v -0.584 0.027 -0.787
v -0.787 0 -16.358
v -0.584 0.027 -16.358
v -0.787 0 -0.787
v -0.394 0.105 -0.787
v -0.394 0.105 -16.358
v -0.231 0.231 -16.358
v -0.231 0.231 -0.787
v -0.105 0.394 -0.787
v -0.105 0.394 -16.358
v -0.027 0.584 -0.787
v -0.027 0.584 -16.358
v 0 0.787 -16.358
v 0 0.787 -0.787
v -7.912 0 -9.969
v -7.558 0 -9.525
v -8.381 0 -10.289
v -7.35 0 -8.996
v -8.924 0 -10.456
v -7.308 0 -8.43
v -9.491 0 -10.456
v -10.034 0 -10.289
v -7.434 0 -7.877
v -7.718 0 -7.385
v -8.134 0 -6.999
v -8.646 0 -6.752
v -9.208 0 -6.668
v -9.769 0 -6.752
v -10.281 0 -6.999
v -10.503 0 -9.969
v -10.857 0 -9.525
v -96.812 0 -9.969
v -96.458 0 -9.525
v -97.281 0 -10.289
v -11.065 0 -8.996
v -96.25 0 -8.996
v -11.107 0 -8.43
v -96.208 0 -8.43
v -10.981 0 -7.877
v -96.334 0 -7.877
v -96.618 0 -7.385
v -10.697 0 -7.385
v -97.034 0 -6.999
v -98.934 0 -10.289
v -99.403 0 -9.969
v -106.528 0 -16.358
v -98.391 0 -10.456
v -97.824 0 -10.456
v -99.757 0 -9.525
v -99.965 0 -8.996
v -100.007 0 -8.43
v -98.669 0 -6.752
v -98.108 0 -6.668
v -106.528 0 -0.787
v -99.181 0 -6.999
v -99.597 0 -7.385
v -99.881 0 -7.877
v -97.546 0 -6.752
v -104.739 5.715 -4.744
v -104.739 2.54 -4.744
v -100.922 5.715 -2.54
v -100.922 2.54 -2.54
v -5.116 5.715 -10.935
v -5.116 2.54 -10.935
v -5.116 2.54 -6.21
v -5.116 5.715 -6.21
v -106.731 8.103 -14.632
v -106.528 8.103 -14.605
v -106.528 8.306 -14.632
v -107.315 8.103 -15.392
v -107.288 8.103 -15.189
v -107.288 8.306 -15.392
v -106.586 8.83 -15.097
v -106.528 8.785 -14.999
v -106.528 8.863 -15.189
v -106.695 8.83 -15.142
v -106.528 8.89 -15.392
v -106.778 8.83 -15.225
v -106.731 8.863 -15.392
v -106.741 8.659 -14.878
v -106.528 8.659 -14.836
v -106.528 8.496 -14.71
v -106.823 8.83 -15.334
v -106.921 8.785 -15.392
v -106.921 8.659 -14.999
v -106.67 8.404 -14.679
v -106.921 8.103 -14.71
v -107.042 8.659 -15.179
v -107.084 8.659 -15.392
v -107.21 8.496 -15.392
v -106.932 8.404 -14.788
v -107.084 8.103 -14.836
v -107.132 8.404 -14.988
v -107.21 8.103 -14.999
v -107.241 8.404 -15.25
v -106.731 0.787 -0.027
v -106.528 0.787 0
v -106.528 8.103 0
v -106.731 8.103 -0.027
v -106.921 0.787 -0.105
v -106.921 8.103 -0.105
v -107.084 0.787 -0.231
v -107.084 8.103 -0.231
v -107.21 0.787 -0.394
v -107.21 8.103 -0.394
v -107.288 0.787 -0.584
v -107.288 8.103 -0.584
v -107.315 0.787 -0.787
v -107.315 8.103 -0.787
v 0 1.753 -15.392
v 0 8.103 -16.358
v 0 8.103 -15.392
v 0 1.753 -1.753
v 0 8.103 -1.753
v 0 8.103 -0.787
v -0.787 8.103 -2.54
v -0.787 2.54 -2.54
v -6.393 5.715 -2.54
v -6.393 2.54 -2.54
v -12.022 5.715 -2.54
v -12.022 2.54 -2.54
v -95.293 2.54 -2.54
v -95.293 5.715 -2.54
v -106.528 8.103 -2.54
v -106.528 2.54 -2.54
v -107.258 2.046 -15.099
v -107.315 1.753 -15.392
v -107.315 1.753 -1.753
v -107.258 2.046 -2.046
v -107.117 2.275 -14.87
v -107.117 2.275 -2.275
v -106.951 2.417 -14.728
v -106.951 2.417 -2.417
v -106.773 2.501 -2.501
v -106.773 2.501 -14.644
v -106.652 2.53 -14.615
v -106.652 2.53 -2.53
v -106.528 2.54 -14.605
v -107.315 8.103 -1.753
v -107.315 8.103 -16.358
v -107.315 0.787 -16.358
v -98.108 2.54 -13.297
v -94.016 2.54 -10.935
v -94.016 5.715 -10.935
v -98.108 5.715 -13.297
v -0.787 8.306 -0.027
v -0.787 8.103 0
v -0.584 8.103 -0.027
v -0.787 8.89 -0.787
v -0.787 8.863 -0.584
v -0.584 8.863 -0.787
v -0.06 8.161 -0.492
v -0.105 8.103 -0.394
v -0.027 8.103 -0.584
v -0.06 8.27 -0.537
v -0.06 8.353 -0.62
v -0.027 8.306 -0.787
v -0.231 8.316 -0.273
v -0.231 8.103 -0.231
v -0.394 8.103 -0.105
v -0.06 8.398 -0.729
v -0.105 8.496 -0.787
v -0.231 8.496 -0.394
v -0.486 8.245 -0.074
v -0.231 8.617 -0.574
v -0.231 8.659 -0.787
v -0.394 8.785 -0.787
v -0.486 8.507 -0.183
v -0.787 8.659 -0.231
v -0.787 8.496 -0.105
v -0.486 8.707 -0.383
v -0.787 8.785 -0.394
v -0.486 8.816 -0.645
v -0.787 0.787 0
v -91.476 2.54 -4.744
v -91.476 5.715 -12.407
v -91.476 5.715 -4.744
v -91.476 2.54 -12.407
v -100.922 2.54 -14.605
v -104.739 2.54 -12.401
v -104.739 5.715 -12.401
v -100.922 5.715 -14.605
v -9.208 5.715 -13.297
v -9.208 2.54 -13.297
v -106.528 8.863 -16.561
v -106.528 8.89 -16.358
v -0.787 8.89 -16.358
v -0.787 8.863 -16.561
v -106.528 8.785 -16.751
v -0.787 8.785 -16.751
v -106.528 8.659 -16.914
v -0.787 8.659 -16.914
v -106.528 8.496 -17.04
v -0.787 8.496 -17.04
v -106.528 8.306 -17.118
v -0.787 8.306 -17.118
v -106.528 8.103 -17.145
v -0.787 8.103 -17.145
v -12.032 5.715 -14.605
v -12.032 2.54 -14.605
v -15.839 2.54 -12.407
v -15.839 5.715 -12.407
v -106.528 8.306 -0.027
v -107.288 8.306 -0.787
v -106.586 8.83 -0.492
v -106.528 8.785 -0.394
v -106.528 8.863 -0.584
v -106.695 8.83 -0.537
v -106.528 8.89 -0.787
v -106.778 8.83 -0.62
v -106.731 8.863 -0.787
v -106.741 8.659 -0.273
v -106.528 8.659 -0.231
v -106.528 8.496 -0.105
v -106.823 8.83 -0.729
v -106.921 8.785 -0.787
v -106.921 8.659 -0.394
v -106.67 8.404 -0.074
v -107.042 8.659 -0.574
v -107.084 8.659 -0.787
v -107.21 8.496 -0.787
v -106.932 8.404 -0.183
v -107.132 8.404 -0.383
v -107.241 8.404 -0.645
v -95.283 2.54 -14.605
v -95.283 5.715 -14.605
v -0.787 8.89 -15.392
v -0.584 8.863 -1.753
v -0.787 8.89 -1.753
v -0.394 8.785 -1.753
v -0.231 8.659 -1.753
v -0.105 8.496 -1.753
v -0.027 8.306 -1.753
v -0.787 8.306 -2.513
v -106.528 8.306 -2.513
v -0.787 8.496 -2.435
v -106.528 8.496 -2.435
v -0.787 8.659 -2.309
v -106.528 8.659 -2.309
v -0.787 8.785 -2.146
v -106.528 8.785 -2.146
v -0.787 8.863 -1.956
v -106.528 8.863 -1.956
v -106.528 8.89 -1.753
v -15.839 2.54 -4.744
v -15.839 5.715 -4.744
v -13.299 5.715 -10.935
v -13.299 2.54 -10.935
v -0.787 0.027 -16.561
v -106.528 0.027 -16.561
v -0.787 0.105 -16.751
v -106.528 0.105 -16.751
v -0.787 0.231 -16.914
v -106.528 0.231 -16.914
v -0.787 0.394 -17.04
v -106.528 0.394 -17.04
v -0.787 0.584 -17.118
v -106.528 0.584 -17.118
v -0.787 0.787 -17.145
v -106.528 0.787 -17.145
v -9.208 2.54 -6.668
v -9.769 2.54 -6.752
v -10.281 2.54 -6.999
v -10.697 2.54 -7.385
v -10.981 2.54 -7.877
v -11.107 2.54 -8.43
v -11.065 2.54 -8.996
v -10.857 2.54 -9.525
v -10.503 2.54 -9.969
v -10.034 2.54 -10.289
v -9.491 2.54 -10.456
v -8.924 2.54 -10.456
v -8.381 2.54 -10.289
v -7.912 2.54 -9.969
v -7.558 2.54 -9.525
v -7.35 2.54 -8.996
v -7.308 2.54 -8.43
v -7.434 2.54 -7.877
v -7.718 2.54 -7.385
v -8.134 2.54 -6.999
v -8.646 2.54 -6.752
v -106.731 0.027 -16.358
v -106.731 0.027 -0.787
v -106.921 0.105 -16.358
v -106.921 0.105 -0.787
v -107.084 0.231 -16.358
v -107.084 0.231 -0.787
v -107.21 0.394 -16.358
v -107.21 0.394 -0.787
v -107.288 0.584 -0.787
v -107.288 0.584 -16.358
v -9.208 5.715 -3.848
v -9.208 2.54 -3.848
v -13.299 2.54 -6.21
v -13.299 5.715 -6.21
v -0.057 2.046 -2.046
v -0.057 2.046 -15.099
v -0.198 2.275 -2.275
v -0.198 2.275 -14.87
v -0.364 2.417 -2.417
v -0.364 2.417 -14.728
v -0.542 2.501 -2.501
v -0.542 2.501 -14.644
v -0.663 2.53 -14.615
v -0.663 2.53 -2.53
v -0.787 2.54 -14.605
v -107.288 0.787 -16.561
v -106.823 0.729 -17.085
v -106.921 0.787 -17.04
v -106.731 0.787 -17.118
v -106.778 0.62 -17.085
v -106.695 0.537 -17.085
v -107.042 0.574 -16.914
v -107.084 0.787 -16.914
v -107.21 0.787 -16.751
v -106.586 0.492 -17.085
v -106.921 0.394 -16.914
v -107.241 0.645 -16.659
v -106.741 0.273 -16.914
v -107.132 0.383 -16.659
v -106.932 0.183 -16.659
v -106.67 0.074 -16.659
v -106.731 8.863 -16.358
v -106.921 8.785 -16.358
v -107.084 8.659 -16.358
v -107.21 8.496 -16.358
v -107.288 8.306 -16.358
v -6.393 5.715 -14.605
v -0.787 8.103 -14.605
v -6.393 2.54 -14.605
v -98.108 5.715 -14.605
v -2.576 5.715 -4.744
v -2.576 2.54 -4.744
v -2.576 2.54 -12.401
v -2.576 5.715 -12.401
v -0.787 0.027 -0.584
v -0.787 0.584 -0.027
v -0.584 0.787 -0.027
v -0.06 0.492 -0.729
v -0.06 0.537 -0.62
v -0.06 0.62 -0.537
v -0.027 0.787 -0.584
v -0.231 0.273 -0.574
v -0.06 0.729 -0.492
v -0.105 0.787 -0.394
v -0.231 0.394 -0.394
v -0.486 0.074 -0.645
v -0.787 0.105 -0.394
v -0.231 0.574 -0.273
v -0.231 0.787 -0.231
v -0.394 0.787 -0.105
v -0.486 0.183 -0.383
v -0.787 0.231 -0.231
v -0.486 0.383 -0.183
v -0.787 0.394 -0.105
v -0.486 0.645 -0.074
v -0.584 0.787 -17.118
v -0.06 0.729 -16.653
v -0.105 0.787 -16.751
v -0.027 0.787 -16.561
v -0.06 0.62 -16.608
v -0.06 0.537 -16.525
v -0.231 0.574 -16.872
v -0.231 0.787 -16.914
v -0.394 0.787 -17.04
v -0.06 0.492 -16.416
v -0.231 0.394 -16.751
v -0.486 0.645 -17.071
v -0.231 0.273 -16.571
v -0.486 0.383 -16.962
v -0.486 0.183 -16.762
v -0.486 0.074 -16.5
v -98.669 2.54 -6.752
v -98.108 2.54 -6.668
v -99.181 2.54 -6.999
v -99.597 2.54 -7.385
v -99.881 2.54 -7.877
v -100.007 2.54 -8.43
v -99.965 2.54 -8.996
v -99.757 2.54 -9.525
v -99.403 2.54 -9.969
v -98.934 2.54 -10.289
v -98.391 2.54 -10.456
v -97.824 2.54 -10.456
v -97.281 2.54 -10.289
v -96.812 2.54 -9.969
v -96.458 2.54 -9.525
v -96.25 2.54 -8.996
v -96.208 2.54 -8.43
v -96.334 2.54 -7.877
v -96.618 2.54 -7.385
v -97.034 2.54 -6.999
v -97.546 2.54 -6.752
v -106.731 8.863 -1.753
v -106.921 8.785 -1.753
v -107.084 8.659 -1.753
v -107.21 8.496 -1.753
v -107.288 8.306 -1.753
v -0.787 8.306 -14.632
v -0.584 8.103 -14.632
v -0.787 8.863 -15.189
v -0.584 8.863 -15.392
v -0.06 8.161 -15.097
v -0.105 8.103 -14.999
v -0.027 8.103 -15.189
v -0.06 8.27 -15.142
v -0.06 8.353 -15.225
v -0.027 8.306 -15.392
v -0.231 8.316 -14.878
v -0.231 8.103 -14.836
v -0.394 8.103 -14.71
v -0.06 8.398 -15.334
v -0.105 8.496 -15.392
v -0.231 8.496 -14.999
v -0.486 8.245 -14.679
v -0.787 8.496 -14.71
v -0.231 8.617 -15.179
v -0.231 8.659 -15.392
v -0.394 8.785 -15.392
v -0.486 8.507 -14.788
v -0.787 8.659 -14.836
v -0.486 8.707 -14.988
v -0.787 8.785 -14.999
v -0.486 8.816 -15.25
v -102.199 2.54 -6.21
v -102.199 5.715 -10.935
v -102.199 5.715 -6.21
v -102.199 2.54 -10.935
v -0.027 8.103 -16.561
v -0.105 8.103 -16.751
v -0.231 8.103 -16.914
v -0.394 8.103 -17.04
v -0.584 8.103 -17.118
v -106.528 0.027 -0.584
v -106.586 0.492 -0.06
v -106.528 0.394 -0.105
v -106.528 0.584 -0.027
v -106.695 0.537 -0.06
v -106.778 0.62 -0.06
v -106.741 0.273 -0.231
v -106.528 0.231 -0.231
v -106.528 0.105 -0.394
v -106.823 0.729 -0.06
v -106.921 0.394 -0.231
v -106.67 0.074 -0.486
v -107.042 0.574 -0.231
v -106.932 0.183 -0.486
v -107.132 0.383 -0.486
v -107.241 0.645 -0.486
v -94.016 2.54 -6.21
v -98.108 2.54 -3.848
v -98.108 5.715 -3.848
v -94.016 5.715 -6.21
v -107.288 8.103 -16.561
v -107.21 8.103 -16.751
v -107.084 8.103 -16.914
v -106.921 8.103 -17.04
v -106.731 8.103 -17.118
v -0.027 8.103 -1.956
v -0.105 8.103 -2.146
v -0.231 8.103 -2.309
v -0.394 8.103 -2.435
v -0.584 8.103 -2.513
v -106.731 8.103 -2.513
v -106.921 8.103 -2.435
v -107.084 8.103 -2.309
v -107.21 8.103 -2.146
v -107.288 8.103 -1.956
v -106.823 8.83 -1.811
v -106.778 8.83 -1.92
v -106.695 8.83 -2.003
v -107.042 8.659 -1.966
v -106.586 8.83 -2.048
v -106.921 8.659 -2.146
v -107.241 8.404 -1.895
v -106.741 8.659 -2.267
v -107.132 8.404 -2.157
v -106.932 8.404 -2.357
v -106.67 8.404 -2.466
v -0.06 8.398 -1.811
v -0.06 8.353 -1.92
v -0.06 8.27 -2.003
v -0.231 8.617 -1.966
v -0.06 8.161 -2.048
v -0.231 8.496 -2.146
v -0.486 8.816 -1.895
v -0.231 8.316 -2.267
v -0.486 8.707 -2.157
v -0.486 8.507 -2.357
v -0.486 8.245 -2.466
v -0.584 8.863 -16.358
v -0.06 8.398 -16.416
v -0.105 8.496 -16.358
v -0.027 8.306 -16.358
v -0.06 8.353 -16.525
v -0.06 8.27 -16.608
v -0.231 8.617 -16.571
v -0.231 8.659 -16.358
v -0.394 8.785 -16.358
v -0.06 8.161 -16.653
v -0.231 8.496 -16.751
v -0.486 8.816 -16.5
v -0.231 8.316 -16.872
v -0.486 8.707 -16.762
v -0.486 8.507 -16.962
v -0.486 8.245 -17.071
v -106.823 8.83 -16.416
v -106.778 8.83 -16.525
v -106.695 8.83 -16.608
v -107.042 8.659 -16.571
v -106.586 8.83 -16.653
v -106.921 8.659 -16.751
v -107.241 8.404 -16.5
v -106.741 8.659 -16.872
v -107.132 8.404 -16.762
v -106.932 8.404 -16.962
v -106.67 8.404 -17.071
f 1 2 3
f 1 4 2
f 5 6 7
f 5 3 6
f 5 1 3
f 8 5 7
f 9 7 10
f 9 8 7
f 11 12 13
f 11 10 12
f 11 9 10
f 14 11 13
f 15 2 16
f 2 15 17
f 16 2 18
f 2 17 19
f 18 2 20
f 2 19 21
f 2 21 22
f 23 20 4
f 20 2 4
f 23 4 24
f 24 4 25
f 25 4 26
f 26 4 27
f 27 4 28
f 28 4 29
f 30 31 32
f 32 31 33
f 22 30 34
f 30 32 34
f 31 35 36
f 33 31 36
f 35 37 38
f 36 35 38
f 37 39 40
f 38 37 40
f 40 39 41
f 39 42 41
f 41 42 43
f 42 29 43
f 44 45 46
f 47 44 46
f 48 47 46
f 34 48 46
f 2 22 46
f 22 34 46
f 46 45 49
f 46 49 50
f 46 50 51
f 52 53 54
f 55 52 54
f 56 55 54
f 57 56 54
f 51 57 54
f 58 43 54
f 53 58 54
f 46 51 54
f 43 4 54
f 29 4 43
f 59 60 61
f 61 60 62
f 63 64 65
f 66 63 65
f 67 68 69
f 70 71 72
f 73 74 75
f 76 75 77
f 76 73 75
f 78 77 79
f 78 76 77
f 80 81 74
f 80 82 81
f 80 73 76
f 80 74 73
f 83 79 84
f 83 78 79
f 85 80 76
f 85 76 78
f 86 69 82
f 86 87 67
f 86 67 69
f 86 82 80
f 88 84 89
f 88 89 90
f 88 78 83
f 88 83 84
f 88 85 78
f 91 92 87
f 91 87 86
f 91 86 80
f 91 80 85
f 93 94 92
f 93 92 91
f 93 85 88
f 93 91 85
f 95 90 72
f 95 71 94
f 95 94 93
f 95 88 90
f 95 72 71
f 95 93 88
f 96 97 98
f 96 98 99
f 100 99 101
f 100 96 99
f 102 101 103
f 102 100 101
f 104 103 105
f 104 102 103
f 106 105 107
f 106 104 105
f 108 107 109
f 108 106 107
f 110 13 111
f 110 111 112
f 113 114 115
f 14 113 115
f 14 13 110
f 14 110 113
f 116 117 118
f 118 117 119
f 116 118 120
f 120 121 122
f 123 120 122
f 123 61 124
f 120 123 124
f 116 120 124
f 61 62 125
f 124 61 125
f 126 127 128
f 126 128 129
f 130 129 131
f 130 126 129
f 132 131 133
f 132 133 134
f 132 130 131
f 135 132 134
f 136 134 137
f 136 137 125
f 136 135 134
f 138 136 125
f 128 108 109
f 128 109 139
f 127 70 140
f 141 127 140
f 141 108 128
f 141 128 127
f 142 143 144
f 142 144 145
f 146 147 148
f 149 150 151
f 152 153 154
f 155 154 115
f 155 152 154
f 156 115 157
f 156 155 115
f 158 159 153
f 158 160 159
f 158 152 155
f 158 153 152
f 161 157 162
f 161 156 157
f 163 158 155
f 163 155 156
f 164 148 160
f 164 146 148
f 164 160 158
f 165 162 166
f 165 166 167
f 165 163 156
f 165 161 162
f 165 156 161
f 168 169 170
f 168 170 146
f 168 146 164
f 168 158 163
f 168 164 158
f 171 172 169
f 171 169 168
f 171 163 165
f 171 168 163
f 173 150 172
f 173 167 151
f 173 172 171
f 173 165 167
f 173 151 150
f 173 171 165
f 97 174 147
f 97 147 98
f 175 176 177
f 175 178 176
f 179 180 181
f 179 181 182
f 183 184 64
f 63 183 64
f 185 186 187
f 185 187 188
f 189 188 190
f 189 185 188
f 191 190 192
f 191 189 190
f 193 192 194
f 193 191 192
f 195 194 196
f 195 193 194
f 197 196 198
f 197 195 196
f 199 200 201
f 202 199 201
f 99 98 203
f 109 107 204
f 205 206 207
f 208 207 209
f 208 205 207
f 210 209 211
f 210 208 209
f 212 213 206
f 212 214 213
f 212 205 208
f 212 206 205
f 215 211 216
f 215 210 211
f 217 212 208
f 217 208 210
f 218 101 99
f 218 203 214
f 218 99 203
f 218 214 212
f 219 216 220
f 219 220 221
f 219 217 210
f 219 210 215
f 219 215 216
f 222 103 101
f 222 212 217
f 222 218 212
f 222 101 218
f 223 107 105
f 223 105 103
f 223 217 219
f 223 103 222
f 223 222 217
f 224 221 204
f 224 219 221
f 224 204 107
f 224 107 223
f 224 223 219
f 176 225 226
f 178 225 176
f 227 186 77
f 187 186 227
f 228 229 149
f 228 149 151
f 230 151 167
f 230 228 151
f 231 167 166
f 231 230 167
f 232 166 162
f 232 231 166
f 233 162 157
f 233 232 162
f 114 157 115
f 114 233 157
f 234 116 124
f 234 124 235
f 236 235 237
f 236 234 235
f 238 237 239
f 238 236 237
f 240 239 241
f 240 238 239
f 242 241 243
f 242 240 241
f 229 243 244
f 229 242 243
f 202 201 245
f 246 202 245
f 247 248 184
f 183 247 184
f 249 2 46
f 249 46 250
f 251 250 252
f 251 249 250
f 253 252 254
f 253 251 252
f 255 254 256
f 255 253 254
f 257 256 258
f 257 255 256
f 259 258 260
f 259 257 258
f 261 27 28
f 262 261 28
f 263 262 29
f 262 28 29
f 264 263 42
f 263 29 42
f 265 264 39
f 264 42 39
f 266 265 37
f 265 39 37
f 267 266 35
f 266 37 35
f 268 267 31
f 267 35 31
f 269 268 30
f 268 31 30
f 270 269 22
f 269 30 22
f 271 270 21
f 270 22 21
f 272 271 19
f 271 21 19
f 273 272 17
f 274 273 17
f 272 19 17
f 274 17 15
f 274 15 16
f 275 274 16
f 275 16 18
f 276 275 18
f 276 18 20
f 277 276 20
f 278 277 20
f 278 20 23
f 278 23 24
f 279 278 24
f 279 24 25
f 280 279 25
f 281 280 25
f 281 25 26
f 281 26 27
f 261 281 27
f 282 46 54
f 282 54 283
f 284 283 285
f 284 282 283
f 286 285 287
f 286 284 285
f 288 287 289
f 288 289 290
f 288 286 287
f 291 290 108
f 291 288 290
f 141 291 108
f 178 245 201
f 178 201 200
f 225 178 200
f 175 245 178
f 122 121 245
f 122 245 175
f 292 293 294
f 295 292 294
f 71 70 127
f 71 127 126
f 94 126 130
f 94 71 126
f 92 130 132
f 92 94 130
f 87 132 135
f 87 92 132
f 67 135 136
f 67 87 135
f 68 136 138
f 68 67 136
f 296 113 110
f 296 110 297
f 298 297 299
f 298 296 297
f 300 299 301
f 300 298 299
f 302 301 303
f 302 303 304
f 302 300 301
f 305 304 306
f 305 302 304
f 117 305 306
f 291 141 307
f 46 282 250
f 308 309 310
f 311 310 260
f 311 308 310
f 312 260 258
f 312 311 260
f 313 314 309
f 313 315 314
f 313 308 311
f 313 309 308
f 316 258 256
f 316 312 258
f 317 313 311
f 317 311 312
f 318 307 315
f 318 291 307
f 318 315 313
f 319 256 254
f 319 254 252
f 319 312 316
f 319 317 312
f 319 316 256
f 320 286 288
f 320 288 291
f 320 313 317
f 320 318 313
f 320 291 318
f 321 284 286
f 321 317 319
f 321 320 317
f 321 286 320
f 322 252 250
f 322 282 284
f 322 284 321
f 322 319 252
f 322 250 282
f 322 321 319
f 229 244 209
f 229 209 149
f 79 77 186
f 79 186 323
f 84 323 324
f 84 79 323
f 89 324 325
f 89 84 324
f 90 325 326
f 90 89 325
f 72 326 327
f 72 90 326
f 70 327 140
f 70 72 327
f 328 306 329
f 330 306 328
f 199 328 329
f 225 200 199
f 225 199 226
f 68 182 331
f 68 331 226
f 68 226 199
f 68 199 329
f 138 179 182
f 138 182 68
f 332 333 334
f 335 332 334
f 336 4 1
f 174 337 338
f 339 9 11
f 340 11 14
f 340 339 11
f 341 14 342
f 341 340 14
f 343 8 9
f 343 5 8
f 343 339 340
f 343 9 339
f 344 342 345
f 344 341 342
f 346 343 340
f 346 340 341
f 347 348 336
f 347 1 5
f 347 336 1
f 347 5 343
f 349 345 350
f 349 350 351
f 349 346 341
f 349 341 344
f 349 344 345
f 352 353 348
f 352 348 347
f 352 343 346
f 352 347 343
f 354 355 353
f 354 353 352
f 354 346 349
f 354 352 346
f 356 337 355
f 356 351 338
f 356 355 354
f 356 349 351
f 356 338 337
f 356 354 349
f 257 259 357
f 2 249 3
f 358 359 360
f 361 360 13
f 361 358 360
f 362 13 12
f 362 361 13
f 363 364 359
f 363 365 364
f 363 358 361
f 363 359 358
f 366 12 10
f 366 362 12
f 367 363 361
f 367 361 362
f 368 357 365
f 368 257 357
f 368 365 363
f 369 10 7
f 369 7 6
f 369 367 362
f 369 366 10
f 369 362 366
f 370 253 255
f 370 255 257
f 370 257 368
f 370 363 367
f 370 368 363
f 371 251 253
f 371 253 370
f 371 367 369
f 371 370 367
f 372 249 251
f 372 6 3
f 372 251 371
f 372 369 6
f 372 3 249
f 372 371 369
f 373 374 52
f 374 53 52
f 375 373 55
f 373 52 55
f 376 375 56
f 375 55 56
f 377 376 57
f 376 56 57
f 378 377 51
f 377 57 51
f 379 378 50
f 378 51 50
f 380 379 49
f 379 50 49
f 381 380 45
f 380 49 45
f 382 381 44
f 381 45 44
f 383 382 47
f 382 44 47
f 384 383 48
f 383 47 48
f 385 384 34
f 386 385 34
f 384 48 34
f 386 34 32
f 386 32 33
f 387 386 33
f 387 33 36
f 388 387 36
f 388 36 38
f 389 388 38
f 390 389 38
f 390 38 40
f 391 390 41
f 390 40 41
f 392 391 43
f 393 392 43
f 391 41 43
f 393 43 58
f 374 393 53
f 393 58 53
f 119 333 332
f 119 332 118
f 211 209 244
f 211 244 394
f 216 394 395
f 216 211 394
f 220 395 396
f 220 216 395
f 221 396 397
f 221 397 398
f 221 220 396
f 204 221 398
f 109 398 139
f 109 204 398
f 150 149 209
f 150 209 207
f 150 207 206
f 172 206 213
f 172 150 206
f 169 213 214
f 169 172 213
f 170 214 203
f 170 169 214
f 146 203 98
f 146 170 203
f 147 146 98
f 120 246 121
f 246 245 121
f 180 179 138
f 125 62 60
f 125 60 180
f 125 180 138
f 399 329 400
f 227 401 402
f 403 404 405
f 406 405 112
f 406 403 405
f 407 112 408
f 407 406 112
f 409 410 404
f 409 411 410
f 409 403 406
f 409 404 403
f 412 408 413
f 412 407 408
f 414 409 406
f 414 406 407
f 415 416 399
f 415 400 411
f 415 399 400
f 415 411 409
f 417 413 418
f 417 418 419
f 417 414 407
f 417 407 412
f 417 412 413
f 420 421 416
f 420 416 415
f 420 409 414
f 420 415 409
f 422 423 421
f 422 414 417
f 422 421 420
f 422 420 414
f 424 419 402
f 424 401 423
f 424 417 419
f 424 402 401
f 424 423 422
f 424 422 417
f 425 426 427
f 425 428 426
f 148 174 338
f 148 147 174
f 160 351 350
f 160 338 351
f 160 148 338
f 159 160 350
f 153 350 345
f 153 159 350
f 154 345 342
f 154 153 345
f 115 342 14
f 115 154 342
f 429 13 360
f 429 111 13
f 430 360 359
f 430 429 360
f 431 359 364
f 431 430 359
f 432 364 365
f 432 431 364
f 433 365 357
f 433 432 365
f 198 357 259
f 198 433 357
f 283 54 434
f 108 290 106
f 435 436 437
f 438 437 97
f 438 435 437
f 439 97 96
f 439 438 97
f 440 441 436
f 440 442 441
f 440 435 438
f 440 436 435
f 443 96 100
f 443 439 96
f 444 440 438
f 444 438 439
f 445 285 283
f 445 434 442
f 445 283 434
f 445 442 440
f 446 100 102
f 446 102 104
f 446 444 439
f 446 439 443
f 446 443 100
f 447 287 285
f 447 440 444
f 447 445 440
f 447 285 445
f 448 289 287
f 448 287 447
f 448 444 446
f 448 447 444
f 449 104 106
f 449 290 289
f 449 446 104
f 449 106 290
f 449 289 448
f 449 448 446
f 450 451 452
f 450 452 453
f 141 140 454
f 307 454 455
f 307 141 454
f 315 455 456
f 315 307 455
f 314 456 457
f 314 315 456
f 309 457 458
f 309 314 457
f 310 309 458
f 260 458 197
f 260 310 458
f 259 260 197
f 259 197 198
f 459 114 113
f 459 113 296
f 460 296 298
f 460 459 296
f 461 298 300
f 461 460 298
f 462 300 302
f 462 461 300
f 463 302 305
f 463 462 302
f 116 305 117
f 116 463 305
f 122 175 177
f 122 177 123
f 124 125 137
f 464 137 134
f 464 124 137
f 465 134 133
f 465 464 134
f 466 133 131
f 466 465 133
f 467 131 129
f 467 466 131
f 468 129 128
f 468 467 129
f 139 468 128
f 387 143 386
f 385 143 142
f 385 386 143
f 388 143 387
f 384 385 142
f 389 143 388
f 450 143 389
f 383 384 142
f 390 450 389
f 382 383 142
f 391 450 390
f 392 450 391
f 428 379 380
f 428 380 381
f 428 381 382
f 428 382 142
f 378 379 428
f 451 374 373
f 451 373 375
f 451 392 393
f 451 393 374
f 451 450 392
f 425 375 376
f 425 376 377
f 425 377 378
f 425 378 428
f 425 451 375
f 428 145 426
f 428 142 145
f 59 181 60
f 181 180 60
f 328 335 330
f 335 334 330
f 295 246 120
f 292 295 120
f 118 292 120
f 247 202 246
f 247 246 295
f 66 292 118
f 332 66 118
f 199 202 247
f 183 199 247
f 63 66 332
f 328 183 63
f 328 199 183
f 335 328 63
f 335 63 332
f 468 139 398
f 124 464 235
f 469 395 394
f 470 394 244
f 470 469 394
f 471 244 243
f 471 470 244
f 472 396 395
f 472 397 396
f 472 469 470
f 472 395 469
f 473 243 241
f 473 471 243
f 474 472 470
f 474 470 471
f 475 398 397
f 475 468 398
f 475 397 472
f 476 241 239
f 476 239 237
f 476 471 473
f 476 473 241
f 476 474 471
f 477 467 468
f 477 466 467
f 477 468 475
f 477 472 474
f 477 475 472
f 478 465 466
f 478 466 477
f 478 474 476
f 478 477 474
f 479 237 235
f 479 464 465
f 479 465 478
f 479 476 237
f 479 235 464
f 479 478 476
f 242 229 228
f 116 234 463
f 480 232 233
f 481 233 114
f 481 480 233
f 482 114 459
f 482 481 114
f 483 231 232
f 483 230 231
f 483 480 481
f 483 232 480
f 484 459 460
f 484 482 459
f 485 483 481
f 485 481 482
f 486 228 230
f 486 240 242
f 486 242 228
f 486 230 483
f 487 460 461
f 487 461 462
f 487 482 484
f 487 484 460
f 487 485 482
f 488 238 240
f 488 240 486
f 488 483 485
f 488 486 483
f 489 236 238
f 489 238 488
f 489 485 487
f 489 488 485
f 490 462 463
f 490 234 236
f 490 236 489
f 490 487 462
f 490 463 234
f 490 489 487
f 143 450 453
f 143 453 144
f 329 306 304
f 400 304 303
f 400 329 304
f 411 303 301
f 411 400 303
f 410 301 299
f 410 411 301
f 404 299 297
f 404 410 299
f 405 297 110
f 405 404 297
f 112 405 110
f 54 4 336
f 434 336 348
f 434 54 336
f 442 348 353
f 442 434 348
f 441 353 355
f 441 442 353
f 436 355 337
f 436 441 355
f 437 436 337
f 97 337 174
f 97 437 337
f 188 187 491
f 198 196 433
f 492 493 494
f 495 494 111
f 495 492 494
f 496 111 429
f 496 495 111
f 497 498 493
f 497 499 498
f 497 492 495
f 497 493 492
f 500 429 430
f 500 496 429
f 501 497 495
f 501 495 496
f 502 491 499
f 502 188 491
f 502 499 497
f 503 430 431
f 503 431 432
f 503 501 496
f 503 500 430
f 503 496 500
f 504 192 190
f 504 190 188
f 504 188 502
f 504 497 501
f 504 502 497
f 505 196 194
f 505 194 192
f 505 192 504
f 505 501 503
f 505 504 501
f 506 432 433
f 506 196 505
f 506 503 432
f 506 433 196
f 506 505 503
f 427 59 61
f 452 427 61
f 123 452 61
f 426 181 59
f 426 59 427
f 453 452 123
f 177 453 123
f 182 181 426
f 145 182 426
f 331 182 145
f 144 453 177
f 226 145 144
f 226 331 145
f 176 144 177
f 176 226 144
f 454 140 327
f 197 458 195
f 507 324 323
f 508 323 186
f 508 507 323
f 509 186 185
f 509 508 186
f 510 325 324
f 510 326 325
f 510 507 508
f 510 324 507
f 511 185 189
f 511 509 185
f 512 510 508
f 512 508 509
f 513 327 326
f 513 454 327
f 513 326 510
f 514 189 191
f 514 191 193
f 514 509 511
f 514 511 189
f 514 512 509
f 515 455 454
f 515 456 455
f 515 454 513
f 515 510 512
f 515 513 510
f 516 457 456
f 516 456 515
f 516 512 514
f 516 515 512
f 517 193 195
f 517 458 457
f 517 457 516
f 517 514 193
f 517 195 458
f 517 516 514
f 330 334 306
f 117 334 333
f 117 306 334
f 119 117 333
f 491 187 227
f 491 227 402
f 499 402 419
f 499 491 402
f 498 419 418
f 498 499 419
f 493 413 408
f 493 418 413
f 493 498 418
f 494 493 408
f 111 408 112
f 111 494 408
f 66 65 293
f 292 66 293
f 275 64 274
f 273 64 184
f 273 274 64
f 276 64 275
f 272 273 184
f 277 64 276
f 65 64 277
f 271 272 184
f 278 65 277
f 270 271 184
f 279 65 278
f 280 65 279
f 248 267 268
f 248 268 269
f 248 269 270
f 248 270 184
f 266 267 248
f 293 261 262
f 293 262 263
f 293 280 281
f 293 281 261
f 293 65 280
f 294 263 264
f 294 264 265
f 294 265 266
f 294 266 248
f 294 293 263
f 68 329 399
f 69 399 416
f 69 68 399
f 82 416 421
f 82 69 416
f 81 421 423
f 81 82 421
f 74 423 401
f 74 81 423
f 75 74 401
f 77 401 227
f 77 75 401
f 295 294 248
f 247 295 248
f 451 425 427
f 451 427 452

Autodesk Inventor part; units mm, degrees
ref_plane "YZ Plane" through (0, 0, 0) normal (1, 0, 0) x (0, 1, 0)
ref_plane "XZ Plane" through (0, 0, 0) normal (0, 1, 0) x (-1, 0, 0)
ref_plane "XY Plane" through (0, 0, 0) normal (0, 0, 1) x (1, 0, 0)
sketch "Sketch1" plane through (0, 0, 0) normal (0, 1, 0) x (-1, 0, 0)
  line L0 (0, 0) -> (107.315, 0)
  line L1 (107.315, 0) -> (107.315, -17.145)
  line L2 (107.315, 0) -> (124.46, 0) construction
  line L3 (107.315, -17.145) -> (0, -17.145)
  line L4 (0, -17.145) -> (0, 0)
  dimension "d0" = 107.315
  dimension "d1" = 17.145
  dimension "d2" = 90
extrude "Extrusion1" add sketch "Sketch1" along normal blind 2.54
sketch "Sketch2" plane through (0, 2.54, 0) normal (0, 1, 0) x (1, 0, 0)
  line L0 (0, 0) -> (0, 17.145) projected
  line L1 (0, 8.5725) -> (-9.2075, 8.5725) construction
  line L2 (0, 8.5725) -> (-2.576, 8.5725)
  line L3 (-2.576, 8.5725) -> (-2.576, 12.4012)
  line L4 (-2.576, 8.5725) -> (-2.576, 4.7438)
  line L5 (0, 17.145) -> (0, 14.605)
  line L6 (0, 14.605) -> (-107.315, 14.605)
  line L7 (-107.315, 17.145) -> (-107.315, 0) projected
  line L8 (-107.315, 14.605) -> (-107.315, 17.145)
  line L9 (0, 17.145) -> (-107.315, 17.145) projected
  line L10 (-107.315, 17.145) -> (0, 17.145)
  line L11 (0, 0) -> (0, 2.54)
  line L12 (0, 2.54) -> (-107.315, 2.54)
  line L13 (-107.315, 0) -> (0, 0)
  line L14 (-2.576, 12.4012) -> (-6.3932, 14.605)
  line L15 (-6.3932, 14.605) -> (-12.032, 14.605)
  line L16 (-2.576, 4.7438) -> (-6.3932, 2.54)
  line L17 (-12.032, 14.605) -> (-15.839, 12.4071)
  line L18 (-15.839, 12.4071) -> (-15.839, 4.7438)
  line L19 (-15.839, 4.7438) -> (-12.0218, 2.54)
  line L20 (-9.2075, 13.2969) -> (-5.116, 10.9347)
  line L21 (-5.116, 10.9347) -> (-5.116, 6.2103)
  line L22 (-5.116, 6.2103) -> (-9.2075, 3.8481)
  line L23 (-9.2075, 3.8481) -> (-13.299, 6.2103)
  line L24 (-13.299, 6.2103) -> (-13.299, 10.9347)
  line L25 (-13.299, 10.9347) -> (-9.2075, 13.2969)
  line L26 (-53.6575, 14.605) -> (-53.6575, 2.54) construction
  line L27 (-107.315, 8.5725) -> (-98.1075, 8.5725) construction
  line L28 (-107.315, 8.5725) -> (-104.739, 8.5725)
  line L29 (-104.739, 8.5725) -> (-104.739, 12.4012)
  line L30 (-104.739, 8.5725) -> (-104.739, 4.7438)
  line L31 (-104.739, 12.4012) -> (-100.9218, 14.605)
  line L32 (-104.739, 4.7438) -> (-100.9218, 2.54)
  line L33 (-95.283, 14.605) -> (-91.476, 12.4071)
  line L34 (-91.476, 12.4071) -> (-91.476, 4.7438)
  line L35 (-91.476, 4.7438) -> (-95.2932, 2.54)
  line L36 (-98.1075, 8.5725) -> (-98.1075, 14.605)
  line L37 (-98.1075, 13.2969) -> (-102.199, 10.9347)
  line L38 (-102.199, 10.9347) -> (-102.199, 6.2103)
  line L39 (-102.199, 6.2103) -> (-98.1075, 3.8481)
  line L40 (-98.1075, 3.8481) -> (-94.016, 6.2103)
  line L41 (-94.016, 6.2103) -> (-94.016, 10.9347)
  line L42 (-94.016, 10.9347) -> (-98.1075, 13.2969)
  line L43 (-100.9218, 14.605) -> (-95.283, 14.605)
  line L44 (-100.9218, 2.54) -> (-95.2932, 2.54)
  point P0 (-8.3776, 2.54)
  point P1 (-9.2075, 14.605)
  dimension "d5" = 9.2075
  dimension "d16" = 2.54
  dimension "d17" = 90
  dimension "d18" = 2.54
  dimension "d20" = 5.6388
  dimension "d30" = 4.7244
  dimension "d43" = 2.54
  dimension "d44" = 2.54
  dimension "d45" = 2.54
  dimension "d46" = 2.54
hole "Hole1" at (-9.2075, 2.54, -8.5725) direction (0, -1, 0) diameter 3.81 end through all
extrude "Extrusion2" add sketch "Sketch2" along normal blind 6.35 contours L13 L7 L12 L0 | L6 L7 L9 L0
extrude "Extrusion4" add sketch "Sketch2" along normal blind 3.175 contours L12 L19 L18 L17 L6 L14 L3 L4 L16 | L32 L30 L29 L31 L6 L33 L34 L35 L12
hole "Hole2" at (-98.1075, 2.54, -8.5725) direction (0, -1, 0) diameter 3.81 end through all
fillet "Fillet1" radius 0.7874 22 edges at (-107.315, 0, -8.5725) (-53.6575, 0, 0) (-53.6575, 0, -17.145) (0, 0, -8.5725) (-107.315, 4.445, -17.145) (-107.315, 5.715, -14.605) (-107.315, 2.54, -8.5725) (-107.315, 5.715, -2.54) (-107.315, 4.445, 0) (-107.315, 8.89, -1.27) (-107.315, 8.89, -15.875) (-53.6575, 8.89, -17.145) (-53.6575, 8.89, -14.605) (-53.6575, 8.89, -2.54) (-53.6575, 8.89, 0) (0, 8.89, -1.27) (0, 4.445, 0) (0, 5.715, -2.54) (0, 2.54, -8.5725) (0, 5.715, -14.605) (0, 4.445, -17.145) (0, 8.89, -15.875)
equation "\"BendRadius\" = Thickness"
equation "\"BendReliefWidth\" = Thickness"
equation "\"BendReliefDepth\" = 0.5 * Thickness"
equation "\"CornerReliefSize\" = 4 * Thickness"
equation "\"MinimumRemnant\" = 2 * Thickness"
equation "\"TransitionRadius\" = BendRadius"
equation "\"JacobiRadiusSize\" = Thickness"
equation "\"GapSize\" = Thickness"
equation "\"Thickness\" = 3.048"
properties part number "LiDAR_mount_sweepclamp_Rev.1"
